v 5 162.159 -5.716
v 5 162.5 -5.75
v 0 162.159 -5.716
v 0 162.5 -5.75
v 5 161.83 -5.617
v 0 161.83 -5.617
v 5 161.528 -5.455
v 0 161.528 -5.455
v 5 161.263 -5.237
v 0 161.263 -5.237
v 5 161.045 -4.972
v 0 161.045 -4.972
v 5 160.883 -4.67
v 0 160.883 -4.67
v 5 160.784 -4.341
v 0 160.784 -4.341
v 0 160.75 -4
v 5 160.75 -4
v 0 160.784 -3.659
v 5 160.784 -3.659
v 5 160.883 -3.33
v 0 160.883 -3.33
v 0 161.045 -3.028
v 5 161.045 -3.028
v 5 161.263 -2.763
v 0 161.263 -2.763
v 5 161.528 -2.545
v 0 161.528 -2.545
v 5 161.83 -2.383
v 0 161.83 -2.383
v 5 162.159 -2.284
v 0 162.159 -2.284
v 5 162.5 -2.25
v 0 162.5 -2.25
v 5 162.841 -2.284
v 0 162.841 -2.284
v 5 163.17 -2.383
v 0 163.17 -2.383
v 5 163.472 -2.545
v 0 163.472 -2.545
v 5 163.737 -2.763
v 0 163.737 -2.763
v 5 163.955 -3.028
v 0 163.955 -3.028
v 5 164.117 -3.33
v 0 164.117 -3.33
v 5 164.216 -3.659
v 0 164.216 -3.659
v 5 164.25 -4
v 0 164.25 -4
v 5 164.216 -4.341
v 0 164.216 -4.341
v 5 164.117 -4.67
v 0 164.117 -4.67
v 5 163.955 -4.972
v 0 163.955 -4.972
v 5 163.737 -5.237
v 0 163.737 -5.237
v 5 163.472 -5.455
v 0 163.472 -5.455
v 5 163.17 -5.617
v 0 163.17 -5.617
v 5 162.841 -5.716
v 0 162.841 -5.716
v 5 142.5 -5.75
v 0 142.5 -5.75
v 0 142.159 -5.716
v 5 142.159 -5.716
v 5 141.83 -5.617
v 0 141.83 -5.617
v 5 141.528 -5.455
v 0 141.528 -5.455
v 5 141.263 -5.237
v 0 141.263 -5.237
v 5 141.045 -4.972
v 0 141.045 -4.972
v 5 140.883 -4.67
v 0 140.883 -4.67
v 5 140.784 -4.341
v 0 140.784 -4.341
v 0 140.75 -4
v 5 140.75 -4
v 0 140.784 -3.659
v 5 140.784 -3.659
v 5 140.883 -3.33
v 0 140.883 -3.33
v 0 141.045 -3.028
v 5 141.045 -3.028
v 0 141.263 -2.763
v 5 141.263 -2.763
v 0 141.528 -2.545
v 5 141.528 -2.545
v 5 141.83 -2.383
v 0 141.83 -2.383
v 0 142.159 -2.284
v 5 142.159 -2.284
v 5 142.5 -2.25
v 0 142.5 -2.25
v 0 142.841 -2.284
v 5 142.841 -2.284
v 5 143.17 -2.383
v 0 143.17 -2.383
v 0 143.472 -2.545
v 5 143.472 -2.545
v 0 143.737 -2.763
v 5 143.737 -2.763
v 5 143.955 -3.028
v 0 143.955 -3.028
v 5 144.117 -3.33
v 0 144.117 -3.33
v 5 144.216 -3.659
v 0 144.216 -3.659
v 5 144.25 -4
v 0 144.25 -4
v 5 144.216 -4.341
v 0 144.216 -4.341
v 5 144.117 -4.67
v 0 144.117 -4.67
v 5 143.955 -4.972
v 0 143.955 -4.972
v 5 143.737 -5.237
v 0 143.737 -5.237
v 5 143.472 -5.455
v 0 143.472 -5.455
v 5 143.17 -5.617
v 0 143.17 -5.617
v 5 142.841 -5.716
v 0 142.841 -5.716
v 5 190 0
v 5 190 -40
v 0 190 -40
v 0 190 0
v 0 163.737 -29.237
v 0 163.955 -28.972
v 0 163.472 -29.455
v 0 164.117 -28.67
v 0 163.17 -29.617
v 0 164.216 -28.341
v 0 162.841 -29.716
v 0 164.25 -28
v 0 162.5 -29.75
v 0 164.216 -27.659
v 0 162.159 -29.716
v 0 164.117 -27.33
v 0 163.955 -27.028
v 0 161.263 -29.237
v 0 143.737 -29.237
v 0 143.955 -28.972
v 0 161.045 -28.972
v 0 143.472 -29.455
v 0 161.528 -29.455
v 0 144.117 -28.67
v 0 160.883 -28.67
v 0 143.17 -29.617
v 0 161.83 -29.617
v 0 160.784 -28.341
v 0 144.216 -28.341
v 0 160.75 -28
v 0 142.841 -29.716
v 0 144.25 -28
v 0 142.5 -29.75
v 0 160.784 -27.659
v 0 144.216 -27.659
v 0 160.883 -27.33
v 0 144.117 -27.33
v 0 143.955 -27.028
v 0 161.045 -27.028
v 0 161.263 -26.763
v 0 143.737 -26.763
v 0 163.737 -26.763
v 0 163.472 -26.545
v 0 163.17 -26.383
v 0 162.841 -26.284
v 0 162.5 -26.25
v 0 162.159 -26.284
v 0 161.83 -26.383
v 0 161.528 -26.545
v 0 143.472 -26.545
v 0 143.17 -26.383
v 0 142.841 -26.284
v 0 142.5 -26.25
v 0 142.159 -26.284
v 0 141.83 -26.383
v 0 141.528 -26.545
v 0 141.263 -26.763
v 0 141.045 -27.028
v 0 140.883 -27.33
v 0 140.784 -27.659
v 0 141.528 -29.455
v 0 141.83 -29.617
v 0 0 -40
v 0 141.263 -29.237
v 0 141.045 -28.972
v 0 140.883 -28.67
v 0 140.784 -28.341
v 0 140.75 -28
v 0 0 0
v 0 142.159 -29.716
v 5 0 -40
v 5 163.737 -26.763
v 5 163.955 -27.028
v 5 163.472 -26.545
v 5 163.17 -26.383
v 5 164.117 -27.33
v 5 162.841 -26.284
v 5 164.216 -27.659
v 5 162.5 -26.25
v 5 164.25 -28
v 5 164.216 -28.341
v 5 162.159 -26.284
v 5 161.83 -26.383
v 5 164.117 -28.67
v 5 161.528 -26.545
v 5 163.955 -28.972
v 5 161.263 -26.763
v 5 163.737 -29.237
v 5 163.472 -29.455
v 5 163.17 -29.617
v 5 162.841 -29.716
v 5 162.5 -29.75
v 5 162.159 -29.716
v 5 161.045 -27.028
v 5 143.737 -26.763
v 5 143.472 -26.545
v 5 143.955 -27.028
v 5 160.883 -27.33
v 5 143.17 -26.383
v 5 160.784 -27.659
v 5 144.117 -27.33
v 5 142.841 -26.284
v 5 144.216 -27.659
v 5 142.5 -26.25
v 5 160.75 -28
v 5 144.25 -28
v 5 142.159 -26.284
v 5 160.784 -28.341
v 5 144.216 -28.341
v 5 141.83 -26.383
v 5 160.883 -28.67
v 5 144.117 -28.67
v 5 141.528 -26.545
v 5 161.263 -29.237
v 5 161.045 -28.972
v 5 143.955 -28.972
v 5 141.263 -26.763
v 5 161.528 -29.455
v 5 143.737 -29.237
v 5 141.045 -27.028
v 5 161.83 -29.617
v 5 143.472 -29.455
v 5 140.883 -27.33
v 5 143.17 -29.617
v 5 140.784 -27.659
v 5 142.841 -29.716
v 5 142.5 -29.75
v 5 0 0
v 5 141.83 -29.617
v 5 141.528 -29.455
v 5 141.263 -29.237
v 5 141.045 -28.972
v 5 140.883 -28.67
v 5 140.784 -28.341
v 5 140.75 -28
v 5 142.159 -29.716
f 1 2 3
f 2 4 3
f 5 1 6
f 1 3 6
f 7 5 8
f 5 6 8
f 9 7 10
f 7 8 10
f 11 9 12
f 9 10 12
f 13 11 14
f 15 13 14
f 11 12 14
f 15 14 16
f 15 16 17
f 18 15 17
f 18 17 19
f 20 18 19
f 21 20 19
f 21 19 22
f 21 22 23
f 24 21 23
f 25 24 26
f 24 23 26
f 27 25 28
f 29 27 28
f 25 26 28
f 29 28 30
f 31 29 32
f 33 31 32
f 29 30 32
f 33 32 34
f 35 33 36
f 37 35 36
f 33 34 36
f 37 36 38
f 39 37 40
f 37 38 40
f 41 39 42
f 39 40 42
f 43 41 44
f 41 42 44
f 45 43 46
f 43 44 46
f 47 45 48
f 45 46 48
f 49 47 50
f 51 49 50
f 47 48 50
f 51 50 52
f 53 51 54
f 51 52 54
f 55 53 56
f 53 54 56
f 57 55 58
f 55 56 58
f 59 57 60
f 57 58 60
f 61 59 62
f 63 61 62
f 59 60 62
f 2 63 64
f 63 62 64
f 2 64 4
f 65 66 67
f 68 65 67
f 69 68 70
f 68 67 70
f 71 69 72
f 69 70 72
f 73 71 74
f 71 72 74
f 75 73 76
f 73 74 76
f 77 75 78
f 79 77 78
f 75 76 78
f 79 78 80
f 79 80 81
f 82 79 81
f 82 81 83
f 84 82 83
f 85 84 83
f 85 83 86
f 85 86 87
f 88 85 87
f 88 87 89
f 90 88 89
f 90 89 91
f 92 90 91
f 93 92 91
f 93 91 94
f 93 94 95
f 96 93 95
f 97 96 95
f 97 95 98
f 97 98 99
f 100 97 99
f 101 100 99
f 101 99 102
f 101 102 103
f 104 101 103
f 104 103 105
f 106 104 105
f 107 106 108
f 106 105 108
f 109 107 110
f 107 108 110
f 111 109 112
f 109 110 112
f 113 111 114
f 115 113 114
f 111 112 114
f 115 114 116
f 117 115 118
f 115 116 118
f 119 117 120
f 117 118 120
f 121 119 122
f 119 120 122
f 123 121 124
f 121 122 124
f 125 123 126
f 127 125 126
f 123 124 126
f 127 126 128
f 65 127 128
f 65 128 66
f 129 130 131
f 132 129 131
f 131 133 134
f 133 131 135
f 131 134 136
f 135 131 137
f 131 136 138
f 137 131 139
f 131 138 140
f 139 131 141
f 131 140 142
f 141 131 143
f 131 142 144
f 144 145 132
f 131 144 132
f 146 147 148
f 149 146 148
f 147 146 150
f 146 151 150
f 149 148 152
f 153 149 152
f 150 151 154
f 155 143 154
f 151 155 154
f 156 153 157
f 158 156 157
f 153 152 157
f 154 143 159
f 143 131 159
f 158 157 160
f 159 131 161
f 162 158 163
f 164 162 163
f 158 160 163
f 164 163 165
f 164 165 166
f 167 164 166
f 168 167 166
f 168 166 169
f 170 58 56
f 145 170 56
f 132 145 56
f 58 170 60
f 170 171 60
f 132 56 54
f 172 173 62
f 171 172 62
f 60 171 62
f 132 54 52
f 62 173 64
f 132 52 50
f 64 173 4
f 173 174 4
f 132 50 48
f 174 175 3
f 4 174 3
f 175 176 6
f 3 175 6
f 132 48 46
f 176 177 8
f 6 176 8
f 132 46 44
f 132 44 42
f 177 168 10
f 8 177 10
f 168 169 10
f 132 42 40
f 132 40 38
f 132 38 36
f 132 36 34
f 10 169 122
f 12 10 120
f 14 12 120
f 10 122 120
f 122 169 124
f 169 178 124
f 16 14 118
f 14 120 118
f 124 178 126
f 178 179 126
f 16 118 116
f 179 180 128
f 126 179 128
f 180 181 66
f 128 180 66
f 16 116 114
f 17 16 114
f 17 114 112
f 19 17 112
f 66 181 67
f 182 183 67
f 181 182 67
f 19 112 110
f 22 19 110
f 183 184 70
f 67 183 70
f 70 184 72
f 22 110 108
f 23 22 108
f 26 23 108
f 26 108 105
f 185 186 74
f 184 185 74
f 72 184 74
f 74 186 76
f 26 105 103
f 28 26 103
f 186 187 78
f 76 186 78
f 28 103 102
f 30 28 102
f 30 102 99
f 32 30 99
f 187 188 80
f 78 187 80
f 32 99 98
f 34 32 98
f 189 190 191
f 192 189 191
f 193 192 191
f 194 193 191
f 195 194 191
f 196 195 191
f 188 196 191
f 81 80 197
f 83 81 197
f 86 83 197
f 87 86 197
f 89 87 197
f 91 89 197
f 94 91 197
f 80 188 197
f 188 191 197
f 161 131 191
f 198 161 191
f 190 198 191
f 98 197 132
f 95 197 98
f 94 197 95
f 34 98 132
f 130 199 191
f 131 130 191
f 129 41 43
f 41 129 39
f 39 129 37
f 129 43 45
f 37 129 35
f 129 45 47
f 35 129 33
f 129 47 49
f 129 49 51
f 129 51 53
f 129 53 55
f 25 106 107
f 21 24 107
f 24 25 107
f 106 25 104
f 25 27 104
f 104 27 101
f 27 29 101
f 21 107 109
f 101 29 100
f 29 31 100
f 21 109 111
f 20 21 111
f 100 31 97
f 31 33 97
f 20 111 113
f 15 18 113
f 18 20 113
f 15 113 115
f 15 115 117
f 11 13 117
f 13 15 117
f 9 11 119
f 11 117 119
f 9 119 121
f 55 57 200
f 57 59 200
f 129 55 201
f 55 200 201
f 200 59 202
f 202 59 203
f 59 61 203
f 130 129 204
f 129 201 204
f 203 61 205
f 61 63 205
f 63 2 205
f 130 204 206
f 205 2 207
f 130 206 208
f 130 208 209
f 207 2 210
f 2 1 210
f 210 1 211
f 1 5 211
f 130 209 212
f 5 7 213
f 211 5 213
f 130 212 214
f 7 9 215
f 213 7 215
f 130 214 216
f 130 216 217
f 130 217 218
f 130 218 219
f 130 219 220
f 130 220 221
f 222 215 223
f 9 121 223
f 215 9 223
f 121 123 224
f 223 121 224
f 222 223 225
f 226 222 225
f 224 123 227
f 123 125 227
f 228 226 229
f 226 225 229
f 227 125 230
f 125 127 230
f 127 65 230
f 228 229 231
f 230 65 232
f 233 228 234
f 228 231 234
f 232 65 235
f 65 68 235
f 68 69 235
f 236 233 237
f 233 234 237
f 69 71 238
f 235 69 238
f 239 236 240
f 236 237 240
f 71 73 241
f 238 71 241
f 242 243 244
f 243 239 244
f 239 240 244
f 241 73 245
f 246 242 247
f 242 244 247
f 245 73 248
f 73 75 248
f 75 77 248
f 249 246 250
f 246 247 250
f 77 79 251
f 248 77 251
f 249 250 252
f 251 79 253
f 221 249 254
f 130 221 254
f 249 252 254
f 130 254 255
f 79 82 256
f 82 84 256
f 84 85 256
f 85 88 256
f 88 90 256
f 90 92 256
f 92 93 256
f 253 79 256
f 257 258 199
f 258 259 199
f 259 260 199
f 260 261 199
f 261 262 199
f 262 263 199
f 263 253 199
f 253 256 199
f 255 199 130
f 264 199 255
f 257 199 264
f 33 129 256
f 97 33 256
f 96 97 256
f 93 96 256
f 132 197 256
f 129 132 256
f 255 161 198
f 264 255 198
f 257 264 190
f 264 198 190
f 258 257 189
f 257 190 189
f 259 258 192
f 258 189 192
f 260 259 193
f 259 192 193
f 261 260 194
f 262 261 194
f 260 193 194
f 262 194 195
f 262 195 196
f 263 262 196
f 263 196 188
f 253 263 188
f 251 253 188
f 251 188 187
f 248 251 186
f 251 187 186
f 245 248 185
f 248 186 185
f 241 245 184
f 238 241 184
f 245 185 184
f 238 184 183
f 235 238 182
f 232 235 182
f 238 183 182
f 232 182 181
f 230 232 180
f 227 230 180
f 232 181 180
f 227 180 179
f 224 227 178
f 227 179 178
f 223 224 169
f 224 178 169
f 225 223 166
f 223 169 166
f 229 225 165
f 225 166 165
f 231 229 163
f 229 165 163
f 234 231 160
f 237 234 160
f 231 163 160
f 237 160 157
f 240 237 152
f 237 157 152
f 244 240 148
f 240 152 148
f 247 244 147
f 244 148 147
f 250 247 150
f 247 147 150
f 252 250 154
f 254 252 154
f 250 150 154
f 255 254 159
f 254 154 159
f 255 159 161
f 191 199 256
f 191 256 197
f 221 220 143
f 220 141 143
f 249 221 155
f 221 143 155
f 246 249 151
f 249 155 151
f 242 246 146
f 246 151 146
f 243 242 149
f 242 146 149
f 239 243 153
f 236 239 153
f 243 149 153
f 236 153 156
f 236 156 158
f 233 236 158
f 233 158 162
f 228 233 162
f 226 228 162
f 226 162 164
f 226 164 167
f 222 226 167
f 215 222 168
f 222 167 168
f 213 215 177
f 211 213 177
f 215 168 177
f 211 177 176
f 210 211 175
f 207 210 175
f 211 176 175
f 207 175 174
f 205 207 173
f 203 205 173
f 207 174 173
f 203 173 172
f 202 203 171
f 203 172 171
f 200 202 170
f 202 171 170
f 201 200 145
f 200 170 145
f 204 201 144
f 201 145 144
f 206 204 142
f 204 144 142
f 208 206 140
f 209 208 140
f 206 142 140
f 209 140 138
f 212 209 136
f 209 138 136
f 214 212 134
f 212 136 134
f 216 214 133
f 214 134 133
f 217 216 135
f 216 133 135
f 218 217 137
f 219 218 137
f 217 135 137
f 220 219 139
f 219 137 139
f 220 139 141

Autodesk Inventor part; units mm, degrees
ref_plane "YZ Plane" through (0, 0, 0) normal (1, 0, 0) x (0, 1, 0)
ref_plane "XZ Plane" through (0, 0, 0) normal (0, 1, 0) x (-1, 0, 0)
ref_plane "XY Plane" through (0, 0, 0) normal (0, 0, 1) x (1, 0, 0)
sketch "スケッチ1" plane through (0, 0, 0) normal (0, 1, 0) x (-1, 0, 0)
  line L0 (0, 0) -> (-5, 0)
  line L1 (-5, 0) -> (-5, -40)
  line L2 (-5, -40) -> (0, -40)
  line L3 (0, -40) -> (0, 0)
  dimension "d0" = 40
  dimension "d3" = 5
extrude "押し出し1" add sketch "スケッチ1" along normal blind 190
sketch "スケッチ2" plane through (5, 0, 0) normal (1, 0, 0) x (0, 0, -1)
  line L0 (0, 0) -> (0, 190) projected
  line L1 (0, 190) -> (40, 190) projected
  line L2 (0, 0) -> (0, 190) projected
  line L3 (40, 0) -> (40, 190) projected
  line L4 (0, 95) -> (40, 95)
  point P0 (4, 162.5)
  point P1 (28, 162.5)
  point P2 (4, 142.5)
  point P3 (28, 142.5)
  dimension "d4" = 4
  dimension "d5" = 27.5
  dimension "d8" = 24
  dimension "d11" = 20
hole "穴1" at (5, 162.5, -4) at (5, 162.5, -28) at (5, 142.5, -4) at (5, 142.5, -28) direction (-1, 0, 0) diameter 3.5 end through all
properties part number "縦フラットバー" material "アルミニウム"
